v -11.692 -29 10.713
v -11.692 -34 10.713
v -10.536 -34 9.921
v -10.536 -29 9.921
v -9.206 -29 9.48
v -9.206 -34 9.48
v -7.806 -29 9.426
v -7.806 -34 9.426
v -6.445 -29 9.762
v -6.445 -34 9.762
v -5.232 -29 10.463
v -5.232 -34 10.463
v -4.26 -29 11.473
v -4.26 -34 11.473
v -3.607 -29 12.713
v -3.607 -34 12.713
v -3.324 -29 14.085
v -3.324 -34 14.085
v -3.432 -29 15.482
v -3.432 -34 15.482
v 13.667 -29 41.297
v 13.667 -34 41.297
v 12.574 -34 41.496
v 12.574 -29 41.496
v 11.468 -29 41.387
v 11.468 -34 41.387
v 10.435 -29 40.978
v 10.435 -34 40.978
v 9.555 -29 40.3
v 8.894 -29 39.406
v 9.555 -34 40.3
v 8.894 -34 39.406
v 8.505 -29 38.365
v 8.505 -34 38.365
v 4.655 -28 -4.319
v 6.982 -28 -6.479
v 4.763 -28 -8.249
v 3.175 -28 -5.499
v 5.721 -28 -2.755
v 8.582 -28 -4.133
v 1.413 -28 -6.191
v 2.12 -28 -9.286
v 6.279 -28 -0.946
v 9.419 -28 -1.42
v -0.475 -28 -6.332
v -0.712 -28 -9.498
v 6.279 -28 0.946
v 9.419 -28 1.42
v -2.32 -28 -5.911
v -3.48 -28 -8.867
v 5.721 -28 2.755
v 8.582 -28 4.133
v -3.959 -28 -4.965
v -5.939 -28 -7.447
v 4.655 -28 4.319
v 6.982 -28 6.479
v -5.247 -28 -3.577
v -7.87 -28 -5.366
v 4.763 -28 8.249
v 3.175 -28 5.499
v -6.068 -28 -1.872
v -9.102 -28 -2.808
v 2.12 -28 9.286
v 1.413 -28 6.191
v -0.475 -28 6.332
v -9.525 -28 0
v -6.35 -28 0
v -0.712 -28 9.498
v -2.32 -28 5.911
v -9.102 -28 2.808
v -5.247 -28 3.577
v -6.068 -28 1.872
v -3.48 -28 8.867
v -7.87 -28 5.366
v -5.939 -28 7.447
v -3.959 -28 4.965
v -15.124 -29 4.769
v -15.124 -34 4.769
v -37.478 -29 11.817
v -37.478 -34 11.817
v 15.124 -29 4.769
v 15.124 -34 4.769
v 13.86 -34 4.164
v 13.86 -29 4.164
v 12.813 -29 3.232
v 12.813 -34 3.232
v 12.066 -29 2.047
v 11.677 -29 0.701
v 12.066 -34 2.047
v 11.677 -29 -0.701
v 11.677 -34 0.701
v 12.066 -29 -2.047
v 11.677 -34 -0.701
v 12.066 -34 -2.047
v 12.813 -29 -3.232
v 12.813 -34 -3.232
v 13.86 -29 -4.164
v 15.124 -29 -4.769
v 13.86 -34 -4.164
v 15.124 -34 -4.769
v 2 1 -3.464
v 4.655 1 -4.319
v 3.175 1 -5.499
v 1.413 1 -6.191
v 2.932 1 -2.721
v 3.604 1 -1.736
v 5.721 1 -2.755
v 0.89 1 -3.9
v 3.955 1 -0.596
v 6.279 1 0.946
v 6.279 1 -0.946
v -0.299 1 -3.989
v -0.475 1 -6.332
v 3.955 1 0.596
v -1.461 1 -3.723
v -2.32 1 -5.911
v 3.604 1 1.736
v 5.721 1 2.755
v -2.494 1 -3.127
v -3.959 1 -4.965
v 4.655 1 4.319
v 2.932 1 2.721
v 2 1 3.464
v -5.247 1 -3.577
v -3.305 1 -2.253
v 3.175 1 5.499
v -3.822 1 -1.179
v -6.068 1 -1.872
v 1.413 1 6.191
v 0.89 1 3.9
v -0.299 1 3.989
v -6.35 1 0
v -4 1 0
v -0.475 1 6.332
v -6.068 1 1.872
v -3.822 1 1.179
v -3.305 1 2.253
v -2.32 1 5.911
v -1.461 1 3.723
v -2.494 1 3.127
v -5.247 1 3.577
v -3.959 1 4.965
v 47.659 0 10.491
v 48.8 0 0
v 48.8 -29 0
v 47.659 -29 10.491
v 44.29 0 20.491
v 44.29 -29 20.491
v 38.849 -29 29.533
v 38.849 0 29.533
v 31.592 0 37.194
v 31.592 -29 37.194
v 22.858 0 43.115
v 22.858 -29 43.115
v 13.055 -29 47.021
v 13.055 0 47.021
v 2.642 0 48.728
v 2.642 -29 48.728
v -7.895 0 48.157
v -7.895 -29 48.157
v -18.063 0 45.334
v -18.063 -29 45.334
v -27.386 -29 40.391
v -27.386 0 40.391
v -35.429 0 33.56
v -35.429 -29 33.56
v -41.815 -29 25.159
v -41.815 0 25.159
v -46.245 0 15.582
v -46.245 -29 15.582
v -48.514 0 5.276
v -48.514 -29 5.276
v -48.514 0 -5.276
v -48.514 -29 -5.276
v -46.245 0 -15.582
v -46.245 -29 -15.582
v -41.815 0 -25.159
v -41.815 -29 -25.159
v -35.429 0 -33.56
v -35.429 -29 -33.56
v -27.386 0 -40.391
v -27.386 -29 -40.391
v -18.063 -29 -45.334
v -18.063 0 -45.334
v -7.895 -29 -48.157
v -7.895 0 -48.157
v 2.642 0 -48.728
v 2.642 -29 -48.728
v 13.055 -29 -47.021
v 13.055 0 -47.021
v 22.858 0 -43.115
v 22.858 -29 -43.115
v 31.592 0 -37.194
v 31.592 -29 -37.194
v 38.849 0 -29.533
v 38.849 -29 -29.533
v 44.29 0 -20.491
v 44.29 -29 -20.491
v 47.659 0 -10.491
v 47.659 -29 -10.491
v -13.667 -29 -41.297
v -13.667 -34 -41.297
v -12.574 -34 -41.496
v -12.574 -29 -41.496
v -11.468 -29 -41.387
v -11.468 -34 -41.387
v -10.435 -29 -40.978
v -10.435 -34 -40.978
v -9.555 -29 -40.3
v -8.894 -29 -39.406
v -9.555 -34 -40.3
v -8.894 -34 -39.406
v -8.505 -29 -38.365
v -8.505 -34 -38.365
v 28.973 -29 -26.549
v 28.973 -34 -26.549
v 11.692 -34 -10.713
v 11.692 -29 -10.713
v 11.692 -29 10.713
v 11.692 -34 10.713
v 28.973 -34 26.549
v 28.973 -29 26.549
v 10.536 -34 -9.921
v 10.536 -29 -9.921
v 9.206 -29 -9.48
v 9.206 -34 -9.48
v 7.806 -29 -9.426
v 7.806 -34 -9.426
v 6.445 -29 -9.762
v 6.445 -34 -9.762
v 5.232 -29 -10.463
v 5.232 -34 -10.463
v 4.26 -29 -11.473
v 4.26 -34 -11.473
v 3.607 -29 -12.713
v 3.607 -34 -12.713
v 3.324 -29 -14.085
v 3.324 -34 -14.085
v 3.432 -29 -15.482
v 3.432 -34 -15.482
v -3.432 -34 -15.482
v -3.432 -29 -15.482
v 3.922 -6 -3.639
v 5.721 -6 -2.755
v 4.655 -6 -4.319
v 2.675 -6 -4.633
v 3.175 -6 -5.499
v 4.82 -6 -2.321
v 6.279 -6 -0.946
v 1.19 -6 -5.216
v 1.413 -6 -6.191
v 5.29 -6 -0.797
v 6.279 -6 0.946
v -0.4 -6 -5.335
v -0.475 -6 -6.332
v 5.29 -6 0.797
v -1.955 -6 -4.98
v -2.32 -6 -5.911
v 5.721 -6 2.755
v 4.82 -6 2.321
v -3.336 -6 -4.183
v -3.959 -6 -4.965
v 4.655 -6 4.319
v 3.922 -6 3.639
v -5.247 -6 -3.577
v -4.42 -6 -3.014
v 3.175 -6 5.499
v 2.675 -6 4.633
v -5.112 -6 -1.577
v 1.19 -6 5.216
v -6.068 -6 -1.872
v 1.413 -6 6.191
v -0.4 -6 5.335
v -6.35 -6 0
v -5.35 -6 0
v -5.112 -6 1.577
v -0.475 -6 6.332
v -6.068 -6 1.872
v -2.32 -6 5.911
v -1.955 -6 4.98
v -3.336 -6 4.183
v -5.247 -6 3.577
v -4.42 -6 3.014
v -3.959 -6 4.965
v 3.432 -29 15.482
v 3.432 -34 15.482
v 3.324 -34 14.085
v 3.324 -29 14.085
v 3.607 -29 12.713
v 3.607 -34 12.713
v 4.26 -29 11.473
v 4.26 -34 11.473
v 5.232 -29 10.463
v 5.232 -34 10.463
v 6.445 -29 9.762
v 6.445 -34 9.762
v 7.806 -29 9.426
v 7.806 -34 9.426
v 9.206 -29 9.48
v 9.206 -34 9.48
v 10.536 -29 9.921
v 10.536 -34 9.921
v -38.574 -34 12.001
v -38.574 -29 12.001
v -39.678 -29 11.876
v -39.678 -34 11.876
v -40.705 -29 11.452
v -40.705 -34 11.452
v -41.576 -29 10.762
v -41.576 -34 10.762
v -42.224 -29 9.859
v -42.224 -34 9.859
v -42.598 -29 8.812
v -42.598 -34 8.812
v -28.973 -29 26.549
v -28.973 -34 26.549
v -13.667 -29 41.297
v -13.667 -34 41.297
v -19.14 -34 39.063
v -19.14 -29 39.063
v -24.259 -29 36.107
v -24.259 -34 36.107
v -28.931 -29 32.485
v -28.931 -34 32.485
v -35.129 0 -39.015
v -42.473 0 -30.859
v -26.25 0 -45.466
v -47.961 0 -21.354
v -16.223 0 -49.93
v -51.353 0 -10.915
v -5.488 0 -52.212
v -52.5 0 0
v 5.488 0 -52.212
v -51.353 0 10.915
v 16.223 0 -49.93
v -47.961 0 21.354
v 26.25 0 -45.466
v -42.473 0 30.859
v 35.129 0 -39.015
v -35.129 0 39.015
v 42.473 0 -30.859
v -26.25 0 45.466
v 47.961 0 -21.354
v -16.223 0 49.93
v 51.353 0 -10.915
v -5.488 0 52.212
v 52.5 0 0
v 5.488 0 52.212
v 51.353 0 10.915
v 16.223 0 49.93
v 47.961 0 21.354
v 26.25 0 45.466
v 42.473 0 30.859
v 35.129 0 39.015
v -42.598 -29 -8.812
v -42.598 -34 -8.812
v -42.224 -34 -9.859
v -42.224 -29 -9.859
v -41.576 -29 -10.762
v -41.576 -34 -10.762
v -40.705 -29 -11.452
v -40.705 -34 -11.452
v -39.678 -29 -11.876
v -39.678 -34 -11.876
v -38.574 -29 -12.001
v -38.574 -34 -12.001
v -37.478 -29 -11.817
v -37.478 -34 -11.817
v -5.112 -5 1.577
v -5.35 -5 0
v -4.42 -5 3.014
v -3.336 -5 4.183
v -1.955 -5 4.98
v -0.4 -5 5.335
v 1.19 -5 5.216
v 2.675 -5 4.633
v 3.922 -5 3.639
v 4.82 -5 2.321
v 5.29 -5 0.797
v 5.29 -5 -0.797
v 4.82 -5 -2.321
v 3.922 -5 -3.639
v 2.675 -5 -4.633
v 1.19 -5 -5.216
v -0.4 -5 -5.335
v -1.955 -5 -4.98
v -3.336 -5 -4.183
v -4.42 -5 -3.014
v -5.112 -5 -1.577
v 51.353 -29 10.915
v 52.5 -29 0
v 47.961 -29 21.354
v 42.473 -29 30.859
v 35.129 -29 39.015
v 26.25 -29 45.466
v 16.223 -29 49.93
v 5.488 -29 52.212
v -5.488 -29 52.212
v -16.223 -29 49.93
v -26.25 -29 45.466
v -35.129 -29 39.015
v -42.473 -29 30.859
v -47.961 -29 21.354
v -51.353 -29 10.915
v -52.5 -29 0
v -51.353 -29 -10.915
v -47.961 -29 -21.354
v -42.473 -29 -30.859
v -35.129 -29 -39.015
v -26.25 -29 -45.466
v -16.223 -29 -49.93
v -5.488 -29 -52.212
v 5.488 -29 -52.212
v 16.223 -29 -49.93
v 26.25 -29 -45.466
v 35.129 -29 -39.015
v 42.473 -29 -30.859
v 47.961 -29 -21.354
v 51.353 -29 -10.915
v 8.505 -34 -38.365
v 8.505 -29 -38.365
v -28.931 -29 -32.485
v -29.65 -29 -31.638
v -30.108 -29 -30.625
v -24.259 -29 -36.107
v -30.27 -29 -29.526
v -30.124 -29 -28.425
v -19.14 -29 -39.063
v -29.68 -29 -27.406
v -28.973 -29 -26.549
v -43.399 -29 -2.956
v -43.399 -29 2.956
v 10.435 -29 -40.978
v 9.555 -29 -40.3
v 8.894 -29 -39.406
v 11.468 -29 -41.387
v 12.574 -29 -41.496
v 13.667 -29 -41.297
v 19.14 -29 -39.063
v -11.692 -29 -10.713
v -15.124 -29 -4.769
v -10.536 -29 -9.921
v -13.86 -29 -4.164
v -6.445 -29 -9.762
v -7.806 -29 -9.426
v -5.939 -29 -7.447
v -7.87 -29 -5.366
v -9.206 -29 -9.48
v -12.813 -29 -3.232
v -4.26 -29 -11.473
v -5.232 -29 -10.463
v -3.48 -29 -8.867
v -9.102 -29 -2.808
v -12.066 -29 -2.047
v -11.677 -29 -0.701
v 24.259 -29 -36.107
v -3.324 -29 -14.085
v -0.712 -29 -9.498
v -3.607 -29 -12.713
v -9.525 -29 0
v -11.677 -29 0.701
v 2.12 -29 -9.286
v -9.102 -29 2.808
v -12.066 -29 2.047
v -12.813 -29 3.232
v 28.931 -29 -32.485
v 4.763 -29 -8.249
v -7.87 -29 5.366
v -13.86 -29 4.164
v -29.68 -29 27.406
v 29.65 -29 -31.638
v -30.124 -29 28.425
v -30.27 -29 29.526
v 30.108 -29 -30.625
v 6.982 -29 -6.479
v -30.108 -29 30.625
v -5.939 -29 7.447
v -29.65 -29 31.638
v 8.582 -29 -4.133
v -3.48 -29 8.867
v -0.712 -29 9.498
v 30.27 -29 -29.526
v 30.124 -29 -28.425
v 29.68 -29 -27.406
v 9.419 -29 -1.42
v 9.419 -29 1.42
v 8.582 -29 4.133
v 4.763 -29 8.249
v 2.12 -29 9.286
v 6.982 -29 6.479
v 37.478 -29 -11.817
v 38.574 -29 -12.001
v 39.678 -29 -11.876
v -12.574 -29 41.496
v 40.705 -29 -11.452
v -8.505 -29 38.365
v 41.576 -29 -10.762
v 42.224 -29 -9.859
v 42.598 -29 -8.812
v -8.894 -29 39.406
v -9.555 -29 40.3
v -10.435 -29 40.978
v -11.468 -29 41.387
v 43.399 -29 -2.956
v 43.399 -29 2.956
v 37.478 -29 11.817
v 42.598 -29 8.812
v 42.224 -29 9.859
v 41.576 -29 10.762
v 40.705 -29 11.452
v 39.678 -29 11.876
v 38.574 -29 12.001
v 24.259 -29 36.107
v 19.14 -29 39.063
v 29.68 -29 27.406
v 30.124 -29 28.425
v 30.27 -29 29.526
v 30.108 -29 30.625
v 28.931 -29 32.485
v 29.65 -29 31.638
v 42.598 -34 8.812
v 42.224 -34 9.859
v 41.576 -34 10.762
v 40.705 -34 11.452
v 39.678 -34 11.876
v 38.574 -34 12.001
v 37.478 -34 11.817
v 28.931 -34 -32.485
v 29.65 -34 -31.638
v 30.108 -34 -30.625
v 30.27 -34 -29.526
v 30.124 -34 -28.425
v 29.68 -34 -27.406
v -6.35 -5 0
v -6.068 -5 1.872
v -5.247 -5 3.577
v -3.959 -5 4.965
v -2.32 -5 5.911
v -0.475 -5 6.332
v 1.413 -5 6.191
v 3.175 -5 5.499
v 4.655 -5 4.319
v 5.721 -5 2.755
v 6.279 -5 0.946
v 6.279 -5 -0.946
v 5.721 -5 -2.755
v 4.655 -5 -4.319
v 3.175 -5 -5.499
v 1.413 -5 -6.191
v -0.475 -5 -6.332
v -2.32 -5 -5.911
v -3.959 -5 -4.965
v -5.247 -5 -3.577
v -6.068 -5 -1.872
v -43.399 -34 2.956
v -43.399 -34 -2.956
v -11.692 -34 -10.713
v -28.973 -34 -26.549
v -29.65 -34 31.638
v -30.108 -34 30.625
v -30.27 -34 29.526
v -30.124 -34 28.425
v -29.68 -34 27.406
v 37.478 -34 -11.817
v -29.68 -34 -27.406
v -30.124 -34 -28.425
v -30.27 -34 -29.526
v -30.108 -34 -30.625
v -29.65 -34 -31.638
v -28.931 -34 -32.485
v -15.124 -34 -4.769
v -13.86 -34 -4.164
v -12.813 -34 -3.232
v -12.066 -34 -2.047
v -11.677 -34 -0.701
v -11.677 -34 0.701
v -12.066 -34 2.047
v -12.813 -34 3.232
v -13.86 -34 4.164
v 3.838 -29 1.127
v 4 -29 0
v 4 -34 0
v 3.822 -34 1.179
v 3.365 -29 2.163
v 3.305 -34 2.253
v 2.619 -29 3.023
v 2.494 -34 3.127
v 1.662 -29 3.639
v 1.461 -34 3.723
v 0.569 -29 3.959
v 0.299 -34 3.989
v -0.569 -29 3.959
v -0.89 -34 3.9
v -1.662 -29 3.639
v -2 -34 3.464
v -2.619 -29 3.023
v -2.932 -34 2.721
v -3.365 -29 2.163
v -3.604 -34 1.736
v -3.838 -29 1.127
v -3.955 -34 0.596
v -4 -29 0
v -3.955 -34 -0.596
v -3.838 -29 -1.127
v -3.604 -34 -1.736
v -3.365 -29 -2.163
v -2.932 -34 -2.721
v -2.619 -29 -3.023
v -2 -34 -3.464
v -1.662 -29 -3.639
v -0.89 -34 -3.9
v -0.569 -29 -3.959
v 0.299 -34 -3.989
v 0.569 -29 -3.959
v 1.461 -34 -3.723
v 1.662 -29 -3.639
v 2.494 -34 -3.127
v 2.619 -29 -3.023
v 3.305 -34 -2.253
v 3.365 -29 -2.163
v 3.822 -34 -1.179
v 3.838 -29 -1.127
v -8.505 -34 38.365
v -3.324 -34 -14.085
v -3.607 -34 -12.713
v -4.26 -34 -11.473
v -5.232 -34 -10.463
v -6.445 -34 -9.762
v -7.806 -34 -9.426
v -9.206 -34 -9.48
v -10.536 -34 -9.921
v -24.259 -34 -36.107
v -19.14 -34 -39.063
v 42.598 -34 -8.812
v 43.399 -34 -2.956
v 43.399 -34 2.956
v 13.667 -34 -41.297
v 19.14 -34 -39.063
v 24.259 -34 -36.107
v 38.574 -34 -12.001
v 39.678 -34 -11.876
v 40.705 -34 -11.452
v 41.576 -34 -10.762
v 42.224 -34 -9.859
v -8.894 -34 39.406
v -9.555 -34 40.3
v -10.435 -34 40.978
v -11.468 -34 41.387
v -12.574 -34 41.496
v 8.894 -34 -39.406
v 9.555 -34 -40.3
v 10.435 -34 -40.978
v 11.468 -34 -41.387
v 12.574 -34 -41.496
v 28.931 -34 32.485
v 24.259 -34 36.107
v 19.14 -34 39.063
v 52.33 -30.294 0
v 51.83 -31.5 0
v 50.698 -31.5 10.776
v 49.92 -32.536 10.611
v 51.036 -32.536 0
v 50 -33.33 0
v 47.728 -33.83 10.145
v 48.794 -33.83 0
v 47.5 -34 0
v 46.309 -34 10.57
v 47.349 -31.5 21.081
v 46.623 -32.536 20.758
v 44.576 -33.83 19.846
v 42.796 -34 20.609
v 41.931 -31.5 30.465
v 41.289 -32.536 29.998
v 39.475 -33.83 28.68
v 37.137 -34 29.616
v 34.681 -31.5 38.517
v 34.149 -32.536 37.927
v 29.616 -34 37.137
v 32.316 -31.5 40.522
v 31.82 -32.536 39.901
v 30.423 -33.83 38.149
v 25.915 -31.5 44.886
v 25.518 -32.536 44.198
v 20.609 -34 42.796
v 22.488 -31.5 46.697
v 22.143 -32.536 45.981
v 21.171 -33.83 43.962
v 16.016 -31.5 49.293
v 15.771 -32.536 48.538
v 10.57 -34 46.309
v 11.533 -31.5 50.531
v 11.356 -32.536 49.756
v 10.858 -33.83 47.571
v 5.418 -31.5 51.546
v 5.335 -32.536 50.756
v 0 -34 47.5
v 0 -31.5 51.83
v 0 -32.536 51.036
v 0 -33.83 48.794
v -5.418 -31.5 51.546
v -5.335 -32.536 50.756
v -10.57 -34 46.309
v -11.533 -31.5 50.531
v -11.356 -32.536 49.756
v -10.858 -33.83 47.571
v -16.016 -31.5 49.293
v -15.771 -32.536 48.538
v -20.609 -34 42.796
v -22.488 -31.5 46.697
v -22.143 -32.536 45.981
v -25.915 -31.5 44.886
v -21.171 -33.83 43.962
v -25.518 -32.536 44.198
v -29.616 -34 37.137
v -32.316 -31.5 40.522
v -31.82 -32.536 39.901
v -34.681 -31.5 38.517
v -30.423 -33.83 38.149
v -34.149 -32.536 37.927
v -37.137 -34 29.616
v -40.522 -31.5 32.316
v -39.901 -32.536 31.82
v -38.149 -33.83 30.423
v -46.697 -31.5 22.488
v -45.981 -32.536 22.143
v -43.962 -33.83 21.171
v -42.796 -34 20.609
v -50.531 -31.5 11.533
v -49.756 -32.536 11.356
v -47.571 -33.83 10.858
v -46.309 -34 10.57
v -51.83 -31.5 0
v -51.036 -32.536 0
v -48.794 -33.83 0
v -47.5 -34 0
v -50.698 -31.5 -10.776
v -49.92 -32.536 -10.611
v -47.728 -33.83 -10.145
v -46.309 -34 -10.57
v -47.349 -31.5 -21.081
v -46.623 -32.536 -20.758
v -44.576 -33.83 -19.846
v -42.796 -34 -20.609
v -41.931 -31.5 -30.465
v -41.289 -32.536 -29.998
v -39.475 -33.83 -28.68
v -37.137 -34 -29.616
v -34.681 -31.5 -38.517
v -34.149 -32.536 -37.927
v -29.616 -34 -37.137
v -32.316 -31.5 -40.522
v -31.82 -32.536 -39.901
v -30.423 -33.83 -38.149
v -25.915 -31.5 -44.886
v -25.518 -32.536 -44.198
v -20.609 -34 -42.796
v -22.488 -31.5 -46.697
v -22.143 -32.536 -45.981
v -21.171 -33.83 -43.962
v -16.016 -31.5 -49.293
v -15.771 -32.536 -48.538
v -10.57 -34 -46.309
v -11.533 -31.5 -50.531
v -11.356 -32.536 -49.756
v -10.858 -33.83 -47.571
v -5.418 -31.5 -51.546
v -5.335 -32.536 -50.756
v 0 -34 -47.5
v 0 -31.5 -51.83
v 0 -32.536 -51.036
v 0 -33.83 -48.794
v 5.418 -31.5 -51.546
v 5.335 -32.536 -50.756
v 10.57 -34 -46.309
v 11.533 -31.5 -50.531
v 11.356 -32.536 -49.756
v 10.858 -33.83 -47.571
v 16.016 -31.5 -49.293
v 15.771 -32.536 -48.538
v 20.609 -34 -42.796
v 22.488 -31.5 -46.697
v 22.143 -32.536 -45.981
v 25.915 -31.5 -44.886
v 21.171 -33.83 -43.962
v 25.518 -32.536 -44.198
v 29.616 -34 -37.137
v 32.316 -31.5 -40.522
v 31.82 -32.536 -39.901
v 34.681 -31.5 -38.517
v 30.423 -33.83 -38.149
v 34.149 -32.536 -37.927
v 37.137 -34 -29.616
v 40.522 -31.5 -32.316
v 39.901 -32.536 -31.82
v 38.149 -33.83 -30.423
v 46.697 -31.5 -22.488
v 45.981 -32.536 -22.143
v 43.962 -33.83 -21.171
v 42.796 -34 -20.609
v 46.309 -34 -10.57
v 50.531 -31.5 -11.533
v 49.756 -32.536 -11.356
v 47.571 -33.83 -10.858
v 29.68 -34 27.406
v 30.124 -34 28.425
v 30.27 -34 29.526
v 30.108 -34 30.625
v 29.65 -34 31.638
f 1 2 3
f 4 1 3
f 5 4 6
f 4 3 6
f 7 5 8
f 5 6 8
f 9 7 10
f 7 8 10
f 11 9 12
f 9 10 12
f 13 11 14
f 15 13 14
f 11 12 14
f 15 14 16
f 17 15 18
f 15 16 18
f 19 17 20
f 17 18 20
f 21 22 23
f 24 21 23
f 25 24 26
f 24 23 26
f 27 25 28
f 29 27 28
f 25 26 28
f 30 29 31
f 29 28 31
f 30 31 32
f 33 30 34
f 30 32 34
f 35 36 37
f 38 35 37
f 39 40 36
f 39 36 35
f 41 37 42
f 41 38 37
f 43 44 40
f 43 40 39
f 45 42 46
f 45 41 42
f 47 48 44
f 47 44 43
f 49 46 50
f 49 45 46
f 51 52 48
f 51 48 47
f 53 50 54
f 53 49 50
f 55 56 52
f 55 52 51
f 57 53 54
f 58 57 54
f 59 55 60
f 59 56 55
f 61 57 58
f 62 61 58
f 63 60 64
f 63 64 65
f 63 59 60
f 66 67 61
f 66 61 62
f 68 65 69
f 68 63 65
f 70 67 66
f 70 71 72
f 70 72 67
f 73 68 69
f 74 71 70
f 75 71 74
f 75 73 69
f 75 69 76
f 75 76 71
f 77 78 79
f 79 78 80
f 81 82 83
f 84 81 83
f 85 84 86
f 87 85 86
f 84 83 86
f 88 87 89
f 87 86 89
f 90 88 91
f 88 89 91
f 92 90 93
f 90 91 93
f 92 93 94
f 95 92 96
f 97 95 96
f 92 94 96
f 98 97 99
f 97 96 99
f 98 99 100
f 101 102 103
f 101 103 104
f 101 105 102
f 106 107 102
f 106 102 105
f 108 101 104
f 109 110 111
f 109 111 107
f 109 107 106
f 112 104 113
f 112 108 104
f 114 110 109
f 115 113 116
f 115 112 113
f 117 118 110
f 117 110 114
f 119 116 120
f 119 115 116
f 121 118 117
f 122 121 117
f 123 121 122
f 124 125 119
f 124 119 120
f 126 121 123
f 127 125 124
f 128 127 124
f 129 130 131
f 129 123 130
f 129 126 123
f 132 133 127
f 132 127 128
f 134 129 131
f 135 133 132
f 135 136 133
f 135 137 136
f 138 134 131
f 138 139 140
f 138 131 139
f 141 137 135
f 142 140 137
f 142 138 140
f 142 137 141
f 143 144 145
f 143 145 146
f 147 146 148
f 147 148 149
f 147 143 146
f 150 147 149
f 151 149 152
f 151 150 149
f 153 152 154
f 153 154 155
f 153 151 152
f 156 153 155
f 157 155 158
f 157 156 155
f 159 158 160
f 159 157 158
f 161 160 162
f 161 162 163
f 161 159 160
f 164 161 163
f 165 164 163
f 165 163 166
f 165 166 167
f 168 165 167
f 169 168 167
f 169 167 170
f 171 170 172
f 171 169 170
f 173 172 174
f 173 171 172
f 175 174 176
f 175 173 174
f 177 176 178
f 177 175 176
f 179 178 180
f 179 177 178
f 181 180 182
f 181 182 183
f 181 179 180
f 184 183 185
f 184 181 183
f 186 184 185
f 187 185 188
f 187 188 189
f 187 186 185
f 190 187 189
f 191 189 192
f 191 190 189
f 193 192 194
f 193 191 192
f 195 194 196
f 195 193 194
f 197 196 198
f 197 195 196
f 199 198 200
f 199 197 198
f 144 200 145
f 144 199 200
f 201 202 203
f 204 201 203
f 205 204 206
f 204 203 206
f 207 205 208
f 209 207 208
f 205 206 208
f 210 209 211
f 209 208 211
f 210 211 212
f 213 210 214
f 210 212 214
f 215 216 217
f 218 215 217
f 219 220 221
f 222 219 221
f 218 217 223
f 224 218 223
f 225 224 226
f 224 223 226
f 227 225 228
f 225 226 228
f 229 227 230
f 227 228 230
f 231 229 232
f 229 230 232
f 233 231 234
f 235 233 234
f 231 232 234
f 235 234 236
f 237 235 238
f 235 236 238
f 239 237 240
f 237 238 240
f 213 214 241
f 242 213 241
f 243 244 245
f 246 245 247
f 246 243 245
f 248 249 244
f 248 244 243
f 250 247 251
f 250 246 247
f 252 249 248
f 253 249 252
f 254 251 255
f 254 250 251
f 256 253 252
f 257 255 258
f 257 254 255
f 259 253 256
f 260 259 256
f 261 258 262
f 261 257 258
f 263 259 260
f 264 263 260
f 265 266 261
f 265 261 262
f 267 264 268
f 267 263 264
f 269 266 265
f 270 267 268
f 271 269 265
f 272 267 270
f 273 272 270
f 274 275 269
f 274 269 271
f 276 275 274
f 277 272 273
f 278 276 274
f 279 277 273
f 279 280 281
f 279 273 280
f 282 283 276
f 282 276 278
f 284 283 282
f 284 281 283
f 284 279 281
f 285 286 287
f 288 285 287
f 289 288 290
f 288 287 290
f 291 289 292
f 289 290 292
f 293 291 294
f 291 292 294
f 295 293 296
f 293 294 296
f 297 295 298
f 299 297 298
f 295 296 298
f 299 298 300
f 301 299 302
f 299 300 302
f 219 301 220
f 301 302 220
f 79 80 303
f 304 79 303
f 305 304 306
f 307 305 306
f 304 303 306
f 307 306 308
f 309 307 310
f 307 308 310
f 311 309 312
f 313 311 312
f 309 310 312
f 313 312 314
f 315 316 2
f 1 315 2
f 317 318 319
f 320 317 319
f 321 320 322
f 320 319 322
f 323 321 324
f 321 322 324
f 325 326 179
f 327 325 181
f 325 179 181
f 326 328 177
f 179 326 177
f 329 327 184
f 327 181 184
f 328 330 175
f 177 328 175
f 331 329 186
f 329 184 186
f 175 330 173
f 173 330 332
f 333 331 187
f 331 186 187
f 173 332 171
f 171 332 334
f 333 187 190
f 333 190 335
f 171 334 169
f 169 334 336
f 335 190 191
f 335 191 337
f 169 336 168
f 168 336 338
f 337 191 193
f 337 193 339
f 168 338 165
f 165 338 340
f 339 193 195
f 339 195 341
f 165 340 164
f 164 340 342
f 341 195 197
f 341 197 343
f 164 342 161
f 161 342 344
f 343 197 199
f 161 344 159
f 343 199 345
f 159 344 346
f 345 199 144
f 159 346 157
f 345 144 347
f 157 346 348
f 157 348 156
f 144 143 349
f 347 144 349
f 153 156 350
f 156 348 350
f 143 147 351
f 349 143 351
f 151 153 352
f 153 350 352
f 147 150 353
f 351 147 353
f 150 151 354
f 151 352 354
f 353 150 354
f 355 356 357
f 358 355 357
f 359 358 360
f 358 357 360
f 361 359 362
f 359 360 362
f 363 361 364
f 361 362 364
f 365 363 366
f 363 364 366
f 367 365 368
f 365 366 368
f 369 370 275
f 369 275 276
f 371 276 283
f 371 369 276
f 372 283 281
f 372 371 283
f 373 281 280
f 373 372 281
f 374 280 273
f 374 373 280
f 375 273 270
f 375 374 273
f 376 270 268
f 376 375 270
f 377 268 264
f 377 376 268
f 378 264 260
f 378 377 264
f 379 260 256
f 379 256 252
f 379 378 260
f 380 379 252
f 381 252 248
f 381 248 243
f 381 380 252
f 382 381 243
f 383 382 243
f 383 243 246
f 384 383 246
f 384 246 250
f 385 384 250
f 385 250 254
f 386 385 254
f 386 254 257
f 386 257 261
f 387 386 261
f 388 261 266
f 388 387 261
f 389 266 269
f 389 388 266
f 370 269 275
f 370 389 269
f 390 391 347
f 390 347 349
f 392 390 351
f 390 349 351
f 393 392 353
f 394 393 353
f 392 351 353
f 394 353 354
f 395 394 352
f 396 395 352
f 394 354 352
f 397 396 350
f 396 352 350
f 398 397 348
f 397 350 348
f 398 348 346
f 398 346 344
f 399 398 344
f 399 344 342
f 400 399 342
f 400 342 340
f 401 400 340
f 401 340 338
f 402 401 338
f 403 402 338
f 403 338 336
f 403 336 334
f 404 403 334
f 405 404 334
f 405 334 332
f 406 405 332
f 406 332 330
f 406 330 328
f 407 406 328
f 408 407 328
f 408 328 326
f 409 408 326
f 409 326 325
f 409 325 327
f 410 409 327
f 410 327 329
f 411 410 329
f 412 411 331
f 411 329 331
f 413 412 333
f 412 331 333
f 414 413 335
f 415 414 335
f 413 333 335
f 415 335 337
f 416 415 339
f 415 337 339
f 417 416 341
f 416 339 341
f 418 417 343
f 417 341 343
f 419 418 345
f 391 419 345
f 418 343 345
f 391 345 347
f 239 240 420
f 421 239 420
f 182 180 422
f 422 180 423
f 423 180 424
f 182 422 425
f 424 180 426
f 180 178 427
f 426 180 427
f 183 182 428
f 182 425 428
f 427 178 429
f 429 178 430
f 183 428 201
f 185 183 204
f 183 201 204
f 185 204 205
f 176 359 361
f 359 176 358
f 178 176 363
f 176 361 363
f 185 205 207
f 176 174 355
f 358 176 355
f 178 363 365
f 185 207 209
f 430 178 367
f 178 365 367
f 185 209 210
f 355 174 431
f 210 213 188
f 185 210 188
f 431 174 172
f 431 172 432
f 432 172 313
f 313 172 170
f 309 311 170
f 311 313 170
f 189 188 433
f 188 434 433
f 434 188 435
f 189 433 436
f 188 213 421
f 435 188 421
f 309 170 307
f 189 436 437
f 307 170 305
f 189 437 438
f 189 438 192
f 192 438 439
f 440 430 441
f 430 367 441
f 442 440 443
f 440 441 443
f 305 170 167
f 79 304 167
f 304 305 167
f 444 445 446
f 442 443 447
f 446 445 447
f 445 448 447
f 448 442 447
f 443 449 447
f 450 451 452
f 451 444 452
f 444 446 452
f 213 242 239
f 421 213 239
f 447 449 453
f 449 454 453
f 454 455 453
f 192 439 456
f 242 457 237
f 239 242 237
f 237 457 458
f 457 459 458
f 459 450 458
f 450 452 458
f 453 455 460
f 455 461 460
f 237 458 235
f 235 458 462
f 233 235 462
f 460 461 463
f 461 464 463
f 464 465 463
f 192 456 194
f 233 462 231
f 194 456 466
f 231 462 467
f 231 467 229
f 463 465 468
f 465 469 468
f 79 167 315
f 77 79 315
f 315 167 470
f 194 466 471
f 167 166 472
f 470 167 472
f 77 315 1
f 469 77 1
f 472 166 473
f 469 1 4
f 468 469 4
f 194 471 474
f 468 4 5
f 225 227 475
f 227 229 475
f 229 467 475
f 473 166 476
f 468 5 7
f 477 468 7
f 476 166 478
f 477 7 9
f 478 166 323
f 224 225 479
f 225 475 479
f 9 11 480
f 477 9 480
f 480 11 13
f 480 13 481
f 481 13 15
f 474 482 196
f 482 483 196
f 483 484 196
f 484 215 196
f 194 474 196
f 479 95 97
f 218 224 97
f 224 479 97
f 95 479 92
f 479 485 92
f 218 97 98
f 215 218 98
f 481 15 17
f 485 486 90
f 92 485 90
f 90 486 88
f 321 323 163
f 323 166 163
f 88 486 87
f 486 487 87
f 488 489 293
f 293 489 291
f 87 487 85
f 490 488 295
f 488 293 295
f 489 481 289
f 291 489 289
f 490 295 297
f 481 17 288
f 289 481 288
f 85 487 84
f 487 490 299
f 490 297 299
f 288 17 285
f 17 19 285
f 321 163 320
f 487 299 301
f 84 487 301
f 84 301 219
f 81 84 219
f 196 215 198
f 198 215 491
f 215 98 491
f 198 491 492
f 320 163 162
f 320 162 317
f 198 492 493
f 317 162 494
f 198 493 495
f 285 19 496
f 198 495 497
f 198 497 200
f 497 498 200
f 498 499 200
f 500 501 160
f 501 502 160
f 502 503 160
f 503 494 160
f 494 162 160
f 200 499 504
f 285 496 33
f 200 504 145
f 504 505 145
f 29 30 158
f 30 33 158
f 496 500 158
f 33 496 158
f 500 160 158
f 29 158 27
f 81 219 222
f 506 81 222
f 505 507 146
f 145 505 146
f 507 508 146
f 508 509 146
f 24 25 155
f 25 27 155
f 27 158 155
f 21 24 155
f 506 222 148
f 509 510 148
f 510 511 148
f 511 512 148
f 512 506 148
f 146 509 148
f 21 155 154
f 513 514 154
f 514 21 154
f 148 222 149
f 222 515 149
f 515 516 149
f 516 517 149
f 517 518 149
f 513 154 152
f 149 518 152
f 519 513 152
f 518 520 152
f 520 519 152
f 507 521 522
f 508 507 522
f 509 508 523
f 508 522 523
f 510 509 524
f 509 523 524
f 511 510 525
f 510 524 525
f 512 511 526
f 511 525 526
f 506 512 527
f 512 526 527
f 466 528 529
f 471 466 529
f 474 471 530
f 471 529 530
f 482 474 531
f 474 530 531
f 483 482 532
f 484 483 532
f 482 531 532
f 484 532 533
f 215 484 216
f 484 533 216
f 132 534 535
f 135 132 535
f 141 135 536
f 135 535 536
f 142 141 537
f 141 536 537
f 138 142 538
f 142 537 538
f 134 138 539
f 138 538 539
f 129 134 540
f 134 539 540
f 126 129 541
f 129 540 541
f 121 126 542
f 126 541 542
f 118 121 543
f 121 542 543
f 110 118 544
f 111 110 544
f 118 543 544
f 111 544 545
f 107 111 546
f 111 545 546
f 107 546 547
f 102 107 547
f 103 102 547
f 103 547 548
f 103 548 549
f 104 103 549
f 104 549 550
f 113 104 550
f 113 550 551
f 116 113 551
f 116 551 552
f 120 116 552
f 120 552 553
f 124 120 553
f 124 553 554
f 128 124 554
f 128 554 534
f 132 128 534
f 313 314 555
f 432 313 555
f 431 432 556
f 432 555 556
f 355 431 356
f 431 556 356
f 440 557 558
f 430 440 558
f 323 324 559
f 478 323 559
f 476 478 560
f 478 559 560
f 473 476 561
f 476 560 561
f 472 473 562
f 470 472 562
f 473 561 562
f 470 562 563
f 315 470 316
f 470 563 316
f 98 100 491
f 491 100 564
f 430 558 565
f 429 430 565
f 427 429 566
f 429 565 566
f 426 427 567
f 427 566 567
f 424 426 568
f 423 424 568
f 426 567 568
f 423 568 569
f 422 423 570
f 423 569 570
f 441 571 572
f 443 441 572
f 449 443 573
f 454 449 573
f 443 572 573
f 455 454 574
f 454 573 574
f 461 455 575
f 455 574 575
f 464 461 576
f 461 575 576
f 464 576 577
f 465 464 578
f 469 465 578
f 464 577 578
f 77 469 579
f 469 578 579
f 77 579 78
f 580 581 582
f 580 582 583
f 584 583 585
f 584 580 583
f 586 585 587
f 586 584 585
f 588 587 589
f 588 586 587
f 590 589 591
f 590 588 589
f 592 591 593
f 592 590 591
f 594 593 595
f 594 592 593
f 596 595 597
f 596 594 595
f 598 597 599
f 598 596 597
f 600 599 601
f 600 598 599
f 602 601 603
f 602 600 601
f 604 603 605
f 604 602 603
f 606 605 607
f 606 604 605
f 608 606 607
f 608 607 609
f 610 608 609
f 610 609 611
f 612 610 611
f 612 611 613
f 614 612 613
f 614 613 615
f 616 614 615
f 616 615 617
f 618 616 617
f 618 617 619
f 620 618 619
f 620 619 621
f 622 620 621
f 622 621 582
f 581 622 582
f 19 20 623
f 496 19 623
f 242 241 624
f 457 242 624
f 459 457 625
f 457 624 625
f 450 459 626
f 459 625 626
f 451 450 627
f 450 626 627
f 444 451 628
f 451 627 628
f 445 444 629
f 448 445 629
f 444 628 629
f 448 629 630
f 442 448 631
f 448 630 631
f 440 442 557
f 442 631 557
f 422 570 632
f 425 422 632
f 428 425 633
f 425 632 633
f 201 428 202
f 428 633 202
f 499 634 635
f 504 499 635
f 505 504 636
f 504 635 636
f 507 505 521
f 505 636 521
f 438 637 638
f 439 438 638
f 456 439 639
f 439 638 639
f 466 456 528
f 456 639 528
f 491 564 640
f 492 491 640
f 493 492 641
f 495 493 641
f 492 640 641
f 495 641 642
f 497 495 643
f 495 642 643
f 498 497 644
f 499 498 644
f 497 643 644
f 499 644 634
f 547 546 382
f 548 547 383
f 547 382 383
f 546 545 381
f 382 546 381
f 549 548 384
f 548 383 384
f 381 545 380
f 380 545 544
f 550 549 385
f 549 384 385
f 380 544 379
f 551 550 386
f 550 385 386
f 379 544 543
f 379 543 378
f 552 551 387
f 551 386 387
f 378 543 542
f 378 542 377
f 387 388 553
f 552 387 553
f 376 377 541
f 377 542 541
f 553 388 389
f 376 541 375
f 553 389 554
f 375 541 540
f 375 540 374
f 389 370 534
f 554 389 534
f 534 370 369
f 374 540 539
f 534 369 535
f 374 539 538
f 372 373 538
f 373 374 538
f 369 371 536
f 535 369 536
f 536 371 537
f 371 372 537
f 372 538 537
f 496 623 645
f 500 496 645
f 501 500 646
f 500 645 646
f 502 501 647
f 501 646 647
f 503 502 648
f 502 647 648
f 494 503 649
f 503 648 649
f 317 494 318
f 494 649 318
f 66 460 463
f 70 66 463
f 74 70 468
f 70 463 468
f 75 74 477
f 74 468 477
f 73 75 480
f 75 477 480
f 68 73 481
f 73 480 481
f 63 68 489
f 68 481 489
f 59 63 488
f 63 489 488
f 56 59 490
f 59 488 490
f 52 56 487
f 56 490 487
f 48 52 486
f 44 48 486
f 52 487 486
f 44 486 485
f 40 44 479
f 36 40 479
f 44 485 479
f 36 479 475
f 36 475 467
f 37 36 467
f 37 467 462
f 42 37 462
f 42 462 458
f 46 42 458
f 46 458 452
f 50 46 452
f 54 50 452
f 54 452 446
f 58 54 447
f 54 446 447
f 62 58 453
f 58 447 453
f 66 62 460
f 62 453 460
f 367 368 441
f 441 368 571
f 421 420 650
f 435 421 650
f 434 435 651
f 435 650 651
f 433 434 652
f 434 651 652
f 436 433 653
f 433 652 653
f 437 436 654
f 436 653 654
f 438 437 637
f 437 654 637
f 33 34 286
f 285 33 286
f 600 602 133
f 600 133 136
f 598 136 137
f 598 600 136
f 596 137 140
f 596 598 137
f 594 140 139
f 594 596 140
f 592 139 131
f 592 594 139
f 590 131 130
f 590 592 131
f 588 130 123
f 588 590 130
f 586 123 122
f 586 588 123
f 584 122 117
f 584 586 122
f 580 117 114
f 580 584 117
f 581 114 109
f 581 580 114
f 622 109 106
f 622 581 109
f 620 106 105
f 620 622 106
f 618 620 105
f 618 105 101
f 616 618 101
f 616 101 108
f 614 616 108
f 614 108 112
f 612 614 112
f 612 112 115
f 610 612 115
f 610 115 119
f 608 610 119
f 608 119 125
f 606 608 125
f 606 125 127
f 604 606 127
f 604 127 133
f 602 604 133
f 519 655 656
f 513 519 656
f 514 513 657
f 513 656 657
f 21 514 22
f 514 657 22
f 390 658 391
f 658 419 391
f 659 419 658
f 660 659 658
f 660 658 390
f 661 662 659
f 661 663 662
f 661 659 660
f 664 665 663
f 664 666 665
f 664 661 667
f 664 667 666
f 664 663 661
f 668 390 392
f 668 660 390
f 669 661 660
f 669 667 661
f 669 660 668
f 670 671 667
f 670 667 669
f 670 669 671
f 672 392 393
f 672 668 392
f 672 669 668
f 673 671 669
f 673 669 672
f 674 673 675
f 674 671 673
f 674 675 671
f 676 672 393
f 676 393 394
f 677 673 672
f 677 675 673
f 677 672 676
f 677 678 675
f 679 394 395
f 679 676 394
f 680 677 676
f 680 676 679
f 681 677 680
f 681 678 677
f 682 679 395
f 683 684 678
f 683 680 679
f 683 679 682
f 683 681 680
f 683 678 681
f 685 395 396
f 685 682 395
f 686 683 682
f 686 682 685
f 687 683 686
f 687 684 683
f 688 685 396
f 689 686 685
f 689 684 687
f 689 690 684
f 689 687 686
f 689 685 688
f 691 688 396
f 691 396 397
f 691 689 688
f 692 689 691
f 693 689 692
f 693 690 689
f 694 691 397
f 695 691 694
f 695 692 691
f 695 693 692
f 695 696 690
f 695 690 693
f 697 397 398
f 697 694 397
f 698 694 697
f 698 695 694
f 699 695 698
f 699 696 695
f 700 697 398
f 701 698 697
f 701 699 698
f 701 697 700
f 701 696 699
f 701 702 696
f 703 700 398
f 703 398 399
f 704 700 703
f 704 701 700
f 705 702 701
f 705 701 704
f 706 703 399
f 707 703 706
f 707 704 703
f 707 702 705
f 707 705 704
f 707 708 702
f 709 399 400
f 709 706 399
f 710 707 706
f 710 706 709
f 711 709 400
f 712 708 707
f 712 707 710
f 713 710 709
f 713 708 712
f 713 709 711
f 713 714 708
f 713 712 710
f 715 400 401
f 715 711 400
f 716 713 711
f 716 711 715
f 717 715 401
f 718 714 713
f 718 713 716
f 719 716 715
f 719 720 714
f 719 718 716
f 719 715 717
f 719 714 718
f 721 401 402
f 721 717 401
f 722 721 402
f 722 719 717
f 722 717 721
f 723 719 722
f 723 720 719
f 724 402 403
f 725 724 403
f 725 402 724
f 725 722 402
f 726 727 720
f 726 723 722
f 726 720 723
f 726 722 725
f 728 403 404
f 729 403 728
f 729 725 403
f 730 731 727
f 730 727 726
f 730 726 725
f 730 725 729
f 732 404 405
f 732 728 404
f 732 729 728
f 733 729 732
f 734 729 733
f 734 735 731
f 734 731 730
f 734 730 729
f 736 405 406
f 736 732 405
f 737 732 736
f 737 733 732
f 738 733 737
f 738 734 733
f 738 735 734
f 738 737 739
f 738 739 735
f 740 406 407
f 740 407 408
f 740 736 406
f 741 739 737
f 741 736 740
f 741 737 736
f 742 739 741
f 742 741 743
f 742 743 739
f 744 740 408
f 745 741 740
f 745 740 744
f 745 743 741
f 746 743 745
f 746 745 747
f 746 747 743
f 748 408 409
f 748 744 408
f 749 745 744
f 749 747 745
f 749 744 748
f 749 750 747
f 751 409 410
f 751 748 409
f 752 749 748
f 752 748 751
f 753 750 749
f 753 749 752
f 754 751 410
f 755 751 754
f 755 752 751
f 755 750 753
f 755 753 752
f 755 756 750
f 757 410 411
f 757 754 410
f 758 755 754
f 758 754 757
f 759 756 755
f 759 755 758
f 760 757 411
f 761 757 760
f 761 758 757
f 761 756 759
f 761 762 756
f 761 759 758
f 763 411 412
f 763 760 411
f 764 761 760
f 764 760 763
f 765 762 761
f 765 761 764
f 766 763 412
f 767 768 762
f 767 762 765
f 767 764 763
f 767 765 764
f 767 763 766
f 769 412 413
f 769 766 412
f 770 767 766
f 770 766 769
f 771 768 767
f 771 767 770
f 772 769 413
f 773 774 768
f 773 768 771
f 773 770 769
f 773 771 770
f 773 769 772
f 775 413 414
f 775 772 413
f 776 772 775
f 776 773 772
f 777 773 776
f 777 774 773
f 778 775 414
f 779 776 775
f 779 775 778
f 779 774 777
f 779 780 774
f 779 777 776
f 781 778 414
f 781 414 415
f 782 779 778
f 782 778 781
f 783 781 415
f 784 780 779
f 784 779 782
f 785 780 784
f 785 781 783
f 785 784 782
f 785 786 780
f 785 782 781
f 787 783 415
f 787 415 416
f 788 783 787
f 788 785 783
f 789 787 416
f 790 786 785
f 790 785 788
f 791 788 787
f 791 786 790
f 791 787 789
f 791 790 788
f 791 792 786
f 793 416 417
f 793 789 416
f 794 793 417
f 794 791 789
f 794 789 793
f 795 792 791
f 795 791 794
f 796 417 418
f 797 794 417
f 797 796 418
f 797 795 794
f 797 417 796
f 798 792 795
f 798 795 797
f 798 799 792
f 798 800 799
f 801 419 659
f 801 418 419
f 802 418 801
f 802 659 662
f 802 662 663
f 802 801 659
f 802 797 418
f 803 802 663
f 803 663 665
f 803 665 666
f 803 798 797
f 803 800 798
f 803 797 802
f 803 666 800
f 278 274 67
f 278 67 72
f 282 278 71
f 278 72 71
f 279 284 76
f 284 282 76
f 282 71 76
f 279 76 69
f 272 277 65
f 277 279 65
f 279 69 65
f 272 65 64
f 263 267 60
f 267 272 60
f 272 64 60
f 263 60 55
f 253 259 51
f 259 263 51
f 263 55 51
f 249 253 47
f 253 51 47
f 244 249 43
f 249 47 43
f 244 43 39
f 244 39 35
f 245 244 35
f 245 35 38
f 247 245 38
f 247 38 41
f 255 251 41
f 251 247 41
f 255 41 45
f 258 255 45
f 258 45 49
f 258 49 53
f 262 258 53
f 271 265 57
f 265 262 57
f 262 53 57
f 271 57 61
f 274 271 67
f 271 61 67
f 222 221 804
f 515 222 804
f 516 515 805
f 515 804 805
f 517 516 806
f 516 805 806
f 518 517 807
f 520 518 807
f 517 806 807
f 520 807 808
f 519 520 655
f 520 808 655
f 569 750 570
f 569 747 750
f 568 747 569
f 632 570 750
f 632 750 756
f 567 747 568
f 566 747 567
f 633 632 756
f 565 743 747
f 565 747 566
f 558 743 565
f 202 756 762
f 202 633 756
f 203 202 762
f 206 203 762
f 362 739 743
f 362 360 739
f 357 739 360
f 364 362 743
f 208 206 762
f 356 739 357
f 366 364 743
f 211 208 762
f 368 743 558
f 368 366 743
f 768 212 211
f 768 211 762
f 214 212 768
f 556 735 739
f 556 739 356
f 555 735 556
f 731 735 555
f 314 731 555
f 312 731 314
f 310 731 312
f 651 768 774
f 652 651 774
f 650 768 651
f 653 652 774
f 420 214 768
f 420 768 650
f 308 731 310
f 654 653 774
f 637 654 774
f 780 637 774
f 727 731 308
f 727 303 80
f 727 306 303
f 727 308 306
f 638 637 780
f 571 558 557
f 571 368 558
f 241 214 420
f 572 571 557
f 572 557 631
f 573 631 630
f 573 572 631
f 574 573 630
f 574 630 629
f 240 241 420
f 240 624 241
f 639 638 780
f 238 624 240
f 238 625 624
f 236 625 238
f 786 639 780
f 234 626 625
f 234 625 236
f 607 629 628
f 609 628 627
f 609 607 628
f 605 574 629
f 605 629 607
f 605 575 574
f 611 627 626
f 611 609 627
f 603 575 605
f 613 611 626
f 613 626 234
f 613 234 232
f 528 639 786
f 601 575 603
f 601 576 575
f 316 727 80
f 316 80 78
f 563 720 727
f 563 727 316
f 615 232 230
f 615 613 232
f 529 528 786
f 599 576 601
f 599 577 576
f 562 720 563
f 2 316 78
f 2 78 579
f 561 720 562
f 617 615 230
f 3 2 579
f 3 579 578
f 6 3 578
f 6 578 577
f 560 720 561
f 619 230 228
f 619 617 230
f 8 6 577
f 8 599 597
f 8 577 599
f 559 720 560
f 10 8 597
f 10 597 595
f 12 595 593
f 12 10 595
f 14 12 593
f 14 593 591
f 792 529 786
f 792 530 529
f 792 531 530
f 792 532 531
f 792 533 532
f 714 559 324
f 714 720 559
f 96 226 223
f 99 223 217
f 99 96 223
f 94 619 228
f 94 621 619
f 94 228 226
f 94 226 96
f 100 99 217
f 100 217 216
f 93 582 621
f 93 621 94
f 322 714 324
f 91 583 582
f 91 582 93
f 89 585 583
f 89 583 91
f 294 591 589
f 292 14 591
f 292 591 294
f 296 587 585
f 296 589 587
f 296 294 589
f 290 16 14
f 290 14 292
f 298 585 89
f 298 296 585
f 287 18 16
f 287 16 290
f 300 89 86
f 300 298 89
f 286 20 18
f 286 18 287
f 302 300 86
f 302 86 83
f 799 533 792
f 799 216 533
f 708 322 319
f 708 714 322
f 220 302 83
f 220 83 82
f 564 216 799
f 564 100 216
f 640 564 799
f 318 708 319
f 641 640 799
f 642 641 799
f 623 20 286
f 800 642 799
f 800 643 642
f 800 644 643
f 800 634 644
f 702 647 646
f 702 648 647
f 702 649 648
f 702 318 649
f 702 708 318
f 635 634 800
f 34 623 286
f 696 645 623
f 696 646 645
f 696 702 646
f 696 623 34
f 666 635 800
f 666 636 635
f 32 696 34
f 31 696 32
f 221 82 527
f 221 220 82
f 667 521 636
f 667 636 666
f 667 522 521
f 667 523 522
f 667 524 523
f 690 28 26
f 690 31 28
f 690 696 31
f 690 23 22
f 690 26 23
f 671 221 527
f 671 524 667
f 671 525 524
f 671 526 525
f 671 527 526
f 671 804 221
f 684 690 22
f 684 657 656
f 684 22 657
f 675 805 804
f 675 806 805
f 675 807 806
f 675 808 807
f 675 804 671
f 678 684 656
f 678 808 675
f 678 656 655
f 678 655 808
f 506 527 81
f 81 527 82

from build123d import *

# Parameters (mm, degrees)
F0_R      = 52.5
F0_R_2    = 48.8
F1_DEPTH  = 29
F2_R      = 52.5
F2_R_2    = 4
F3_DEPTH  = 5
F4_R      = 6.35
F4_R_2    = 4
F5_DEPTH  = 30
F7_R      = 6.85
F7_R_2    = 5.35
F8_DEPTH  = 1
F9_R      = 9.525
F9_R_2    = 4.384096
F10_DEPTH = 1
F11_R     = 5
F13_DEPTH = 25


with BuildPart() as f1:
    # F0 (on Front) → F1 (new body)
    with BuildSketch(Plane.XZ):
        Circle(F0_R)
        Circle(F0_R_2, mode=Mode.SUBTRACT)
    extrude(amount=F1_DEPTH)

    # F2 (on face) → F3 (join)
    with BuildSketch(Plane.XZ.offset(29)):
        Circle(F2_R)
        Circle(F2_R_2, mode=Mode.SUBTRACT)
    extrude(amount=F3_DEPTH)

    # F4 (on face) → F5 (join)
    with BuildSketch(Plane(origin=(0, -29, 0), x_dir=(-1, 0, 0), z_dir=(0, 1, 0))):
        Circle(F4_R)
        Circle(F4_R_2, mode=Mode.SUBTRACT)
    extrude(amount=F5_DEPTH)

    # F7 (on offset) → F8 (cut)
    with BuildSketch(Plane(origin=(0, -5, 0), x_dir=(-1, 0, 0), z_dir=(0, 1, 0))):
        Circle(F7_R)
        Circle(F7_R_2, mode=Mode.SUBTRACT)
    extrude(amount=-F8_DEPTH, mode=Mode.SUBTRACT)

    # F9 (on face) → F10 (join)
    with BuildSketch(Plane(origin=(0, -29, 0), x_dir=(-1, 0, 0), z_dir=(0, 1, 0))):
        Circle(F9_R)
        Circle(F9_R_2, mode=Mode.SUBTRACT)
    extrude(amount=F10_DEPTH)

    # F11
    f11_edges = [f1.edges().sort_by_distance(p)[0] for p in [
        (-52.5, -34, 0),
    ]]
    fillet(f11_edges, radius=F11_R)

    # F12 (on face) → F13 (cut)
    with BuildSketch(Plane.XZ.offset(34)):
        with BuildLine():
            ThreePointArc((42.598049, -8.812276), (43.5, 0), (42.598049, 8.812276))
            ThreePointArc((42.598049, 8.812276), (40.705485, 11.451793), (37.478164, 11.81682))
            Line((37.478164, 11.81682), (15.124019, 4.768585))
            ThreePointArc((15.124019, 4.768585), (11.627548, 0), (15.124019, -4.768585))
            Line((15.124019, -4.768585), (37.478164, -11.81682))
            ThreePointArc((37.478164, -11.81682), (40.705485, -11.451793), (42.598049, -8.812276))
        make_face()
        with BuildLine():
            ThreePointArc((28.93068, 32.484855), (21.75, 37.672105), (13.66737, 41.297131))
            ThreePointArc((13.66737, 41.297131), (10.435199, 40.977881), (8.505416, 38.365452))
            Line((8.505416, 38.365452), (3.432294, 15.482077))
            ThreePointArc((3.432294, 15.482077), (5.813774, 10.069752), (11.691725, 10.713492))
            Line((11.691725, 10.713492), (28.972748, 26.548632))
            ThreePointArc((28.972748, 26.548632), (30.270287, 29.526088), (28.93068, 32.484855))
        make_face()
        with BuildLine():
            ThreePointArc((-13.66737, 41.297131), (-21.75, 37.672105), (-28.93068, 32.484855))
            ThreePointArc((-28.93068, 32.484855), (-30.270287, 29.526088), (-28.972748, 26.548632))
            Line((-28.972748, 26.548632), (-11.691725, 10.713492))
            ThreePointArc((-11.691725, 10.713492), (-5.813774, 10.069752), (-3.432294, 15.482077))
            Line((-3.432294, 15.482077), (-8.505416, 38.365452))
            ThreePointArc((-8.505416, 38.365452), (-10.435199, 40.977881), (-13.66737, 41.297131))
        make_face()
        with BuildLine():
            ThreePointArc((-42.598049, 8.812276), (-43.5, 0), (-42.598049, -8.812276))
            ThreePointArc((-42.598049, -8.812276), (-40.705485, -11.451793), (-37.478164, -11.81682))
            Line((-37.478164, -11.81682), (-15.124019, -4.768585))
            ThreePointArc((-15.124019, -4.768585), (-11.627548, 0), (-15.124019, 4.768585))
            Line((-15.124019, 4.768585), (-37.478164, 11.81682))
            ThreePointArc((-37.478164, 11.81682), (-40.705485, 11.451793), (-42.598049, 8.812276))
        make_face()
        with BuildLine():
            ThreePointArc((-28.93068, -32.484855), (-21.75, -37.672105), (-13.66737, -41.297131))
            ThreePointArc((-13.66737, -41.297131), (-10.435199, -40.977881), (-8.505416, -38.365452))
            Line((-8.505416, -38.365452), (-3.432294, -15.482077))
            ThreePointArc((-3.432294, -15.482077), (-5.813774, -10.069752), (-11.691725, -10.713492))
            Line((-11.691725, -10.713492), (-28.972748, -26.548632))
            ThreePointArc((-28.972748, -26.548632), (-30.270287, -29.526088), (-28.93068, -32.484855))
        make_face()
        with BuildLine():
            ThreePointArc((13.66737, -41.297131), (21.75, -37.672105), (28.93068, -32.484855))
            ThreePointArc((28.93068, -32.484855), (30.270287, -29.526088), (28.972748, -26.548632))
            Line((28.972748, -26.548632), (11.691725, -10.713492))
            ThreePointArc((11.691725, -10.713492), (5.813774, -10.069752), (3.432294, -15.482077))
            Line((3.432294, -15.482077), (8.505416, -38.365452))
            ThreePointArc((8.505416, -38.365452), (10.435199, -40.977881), (13.66737, -41.297131))
        make_face()
    extrude(amount=-F13_DEPTH, mode=Mode.SUBTRACT)


solid = f1.part
